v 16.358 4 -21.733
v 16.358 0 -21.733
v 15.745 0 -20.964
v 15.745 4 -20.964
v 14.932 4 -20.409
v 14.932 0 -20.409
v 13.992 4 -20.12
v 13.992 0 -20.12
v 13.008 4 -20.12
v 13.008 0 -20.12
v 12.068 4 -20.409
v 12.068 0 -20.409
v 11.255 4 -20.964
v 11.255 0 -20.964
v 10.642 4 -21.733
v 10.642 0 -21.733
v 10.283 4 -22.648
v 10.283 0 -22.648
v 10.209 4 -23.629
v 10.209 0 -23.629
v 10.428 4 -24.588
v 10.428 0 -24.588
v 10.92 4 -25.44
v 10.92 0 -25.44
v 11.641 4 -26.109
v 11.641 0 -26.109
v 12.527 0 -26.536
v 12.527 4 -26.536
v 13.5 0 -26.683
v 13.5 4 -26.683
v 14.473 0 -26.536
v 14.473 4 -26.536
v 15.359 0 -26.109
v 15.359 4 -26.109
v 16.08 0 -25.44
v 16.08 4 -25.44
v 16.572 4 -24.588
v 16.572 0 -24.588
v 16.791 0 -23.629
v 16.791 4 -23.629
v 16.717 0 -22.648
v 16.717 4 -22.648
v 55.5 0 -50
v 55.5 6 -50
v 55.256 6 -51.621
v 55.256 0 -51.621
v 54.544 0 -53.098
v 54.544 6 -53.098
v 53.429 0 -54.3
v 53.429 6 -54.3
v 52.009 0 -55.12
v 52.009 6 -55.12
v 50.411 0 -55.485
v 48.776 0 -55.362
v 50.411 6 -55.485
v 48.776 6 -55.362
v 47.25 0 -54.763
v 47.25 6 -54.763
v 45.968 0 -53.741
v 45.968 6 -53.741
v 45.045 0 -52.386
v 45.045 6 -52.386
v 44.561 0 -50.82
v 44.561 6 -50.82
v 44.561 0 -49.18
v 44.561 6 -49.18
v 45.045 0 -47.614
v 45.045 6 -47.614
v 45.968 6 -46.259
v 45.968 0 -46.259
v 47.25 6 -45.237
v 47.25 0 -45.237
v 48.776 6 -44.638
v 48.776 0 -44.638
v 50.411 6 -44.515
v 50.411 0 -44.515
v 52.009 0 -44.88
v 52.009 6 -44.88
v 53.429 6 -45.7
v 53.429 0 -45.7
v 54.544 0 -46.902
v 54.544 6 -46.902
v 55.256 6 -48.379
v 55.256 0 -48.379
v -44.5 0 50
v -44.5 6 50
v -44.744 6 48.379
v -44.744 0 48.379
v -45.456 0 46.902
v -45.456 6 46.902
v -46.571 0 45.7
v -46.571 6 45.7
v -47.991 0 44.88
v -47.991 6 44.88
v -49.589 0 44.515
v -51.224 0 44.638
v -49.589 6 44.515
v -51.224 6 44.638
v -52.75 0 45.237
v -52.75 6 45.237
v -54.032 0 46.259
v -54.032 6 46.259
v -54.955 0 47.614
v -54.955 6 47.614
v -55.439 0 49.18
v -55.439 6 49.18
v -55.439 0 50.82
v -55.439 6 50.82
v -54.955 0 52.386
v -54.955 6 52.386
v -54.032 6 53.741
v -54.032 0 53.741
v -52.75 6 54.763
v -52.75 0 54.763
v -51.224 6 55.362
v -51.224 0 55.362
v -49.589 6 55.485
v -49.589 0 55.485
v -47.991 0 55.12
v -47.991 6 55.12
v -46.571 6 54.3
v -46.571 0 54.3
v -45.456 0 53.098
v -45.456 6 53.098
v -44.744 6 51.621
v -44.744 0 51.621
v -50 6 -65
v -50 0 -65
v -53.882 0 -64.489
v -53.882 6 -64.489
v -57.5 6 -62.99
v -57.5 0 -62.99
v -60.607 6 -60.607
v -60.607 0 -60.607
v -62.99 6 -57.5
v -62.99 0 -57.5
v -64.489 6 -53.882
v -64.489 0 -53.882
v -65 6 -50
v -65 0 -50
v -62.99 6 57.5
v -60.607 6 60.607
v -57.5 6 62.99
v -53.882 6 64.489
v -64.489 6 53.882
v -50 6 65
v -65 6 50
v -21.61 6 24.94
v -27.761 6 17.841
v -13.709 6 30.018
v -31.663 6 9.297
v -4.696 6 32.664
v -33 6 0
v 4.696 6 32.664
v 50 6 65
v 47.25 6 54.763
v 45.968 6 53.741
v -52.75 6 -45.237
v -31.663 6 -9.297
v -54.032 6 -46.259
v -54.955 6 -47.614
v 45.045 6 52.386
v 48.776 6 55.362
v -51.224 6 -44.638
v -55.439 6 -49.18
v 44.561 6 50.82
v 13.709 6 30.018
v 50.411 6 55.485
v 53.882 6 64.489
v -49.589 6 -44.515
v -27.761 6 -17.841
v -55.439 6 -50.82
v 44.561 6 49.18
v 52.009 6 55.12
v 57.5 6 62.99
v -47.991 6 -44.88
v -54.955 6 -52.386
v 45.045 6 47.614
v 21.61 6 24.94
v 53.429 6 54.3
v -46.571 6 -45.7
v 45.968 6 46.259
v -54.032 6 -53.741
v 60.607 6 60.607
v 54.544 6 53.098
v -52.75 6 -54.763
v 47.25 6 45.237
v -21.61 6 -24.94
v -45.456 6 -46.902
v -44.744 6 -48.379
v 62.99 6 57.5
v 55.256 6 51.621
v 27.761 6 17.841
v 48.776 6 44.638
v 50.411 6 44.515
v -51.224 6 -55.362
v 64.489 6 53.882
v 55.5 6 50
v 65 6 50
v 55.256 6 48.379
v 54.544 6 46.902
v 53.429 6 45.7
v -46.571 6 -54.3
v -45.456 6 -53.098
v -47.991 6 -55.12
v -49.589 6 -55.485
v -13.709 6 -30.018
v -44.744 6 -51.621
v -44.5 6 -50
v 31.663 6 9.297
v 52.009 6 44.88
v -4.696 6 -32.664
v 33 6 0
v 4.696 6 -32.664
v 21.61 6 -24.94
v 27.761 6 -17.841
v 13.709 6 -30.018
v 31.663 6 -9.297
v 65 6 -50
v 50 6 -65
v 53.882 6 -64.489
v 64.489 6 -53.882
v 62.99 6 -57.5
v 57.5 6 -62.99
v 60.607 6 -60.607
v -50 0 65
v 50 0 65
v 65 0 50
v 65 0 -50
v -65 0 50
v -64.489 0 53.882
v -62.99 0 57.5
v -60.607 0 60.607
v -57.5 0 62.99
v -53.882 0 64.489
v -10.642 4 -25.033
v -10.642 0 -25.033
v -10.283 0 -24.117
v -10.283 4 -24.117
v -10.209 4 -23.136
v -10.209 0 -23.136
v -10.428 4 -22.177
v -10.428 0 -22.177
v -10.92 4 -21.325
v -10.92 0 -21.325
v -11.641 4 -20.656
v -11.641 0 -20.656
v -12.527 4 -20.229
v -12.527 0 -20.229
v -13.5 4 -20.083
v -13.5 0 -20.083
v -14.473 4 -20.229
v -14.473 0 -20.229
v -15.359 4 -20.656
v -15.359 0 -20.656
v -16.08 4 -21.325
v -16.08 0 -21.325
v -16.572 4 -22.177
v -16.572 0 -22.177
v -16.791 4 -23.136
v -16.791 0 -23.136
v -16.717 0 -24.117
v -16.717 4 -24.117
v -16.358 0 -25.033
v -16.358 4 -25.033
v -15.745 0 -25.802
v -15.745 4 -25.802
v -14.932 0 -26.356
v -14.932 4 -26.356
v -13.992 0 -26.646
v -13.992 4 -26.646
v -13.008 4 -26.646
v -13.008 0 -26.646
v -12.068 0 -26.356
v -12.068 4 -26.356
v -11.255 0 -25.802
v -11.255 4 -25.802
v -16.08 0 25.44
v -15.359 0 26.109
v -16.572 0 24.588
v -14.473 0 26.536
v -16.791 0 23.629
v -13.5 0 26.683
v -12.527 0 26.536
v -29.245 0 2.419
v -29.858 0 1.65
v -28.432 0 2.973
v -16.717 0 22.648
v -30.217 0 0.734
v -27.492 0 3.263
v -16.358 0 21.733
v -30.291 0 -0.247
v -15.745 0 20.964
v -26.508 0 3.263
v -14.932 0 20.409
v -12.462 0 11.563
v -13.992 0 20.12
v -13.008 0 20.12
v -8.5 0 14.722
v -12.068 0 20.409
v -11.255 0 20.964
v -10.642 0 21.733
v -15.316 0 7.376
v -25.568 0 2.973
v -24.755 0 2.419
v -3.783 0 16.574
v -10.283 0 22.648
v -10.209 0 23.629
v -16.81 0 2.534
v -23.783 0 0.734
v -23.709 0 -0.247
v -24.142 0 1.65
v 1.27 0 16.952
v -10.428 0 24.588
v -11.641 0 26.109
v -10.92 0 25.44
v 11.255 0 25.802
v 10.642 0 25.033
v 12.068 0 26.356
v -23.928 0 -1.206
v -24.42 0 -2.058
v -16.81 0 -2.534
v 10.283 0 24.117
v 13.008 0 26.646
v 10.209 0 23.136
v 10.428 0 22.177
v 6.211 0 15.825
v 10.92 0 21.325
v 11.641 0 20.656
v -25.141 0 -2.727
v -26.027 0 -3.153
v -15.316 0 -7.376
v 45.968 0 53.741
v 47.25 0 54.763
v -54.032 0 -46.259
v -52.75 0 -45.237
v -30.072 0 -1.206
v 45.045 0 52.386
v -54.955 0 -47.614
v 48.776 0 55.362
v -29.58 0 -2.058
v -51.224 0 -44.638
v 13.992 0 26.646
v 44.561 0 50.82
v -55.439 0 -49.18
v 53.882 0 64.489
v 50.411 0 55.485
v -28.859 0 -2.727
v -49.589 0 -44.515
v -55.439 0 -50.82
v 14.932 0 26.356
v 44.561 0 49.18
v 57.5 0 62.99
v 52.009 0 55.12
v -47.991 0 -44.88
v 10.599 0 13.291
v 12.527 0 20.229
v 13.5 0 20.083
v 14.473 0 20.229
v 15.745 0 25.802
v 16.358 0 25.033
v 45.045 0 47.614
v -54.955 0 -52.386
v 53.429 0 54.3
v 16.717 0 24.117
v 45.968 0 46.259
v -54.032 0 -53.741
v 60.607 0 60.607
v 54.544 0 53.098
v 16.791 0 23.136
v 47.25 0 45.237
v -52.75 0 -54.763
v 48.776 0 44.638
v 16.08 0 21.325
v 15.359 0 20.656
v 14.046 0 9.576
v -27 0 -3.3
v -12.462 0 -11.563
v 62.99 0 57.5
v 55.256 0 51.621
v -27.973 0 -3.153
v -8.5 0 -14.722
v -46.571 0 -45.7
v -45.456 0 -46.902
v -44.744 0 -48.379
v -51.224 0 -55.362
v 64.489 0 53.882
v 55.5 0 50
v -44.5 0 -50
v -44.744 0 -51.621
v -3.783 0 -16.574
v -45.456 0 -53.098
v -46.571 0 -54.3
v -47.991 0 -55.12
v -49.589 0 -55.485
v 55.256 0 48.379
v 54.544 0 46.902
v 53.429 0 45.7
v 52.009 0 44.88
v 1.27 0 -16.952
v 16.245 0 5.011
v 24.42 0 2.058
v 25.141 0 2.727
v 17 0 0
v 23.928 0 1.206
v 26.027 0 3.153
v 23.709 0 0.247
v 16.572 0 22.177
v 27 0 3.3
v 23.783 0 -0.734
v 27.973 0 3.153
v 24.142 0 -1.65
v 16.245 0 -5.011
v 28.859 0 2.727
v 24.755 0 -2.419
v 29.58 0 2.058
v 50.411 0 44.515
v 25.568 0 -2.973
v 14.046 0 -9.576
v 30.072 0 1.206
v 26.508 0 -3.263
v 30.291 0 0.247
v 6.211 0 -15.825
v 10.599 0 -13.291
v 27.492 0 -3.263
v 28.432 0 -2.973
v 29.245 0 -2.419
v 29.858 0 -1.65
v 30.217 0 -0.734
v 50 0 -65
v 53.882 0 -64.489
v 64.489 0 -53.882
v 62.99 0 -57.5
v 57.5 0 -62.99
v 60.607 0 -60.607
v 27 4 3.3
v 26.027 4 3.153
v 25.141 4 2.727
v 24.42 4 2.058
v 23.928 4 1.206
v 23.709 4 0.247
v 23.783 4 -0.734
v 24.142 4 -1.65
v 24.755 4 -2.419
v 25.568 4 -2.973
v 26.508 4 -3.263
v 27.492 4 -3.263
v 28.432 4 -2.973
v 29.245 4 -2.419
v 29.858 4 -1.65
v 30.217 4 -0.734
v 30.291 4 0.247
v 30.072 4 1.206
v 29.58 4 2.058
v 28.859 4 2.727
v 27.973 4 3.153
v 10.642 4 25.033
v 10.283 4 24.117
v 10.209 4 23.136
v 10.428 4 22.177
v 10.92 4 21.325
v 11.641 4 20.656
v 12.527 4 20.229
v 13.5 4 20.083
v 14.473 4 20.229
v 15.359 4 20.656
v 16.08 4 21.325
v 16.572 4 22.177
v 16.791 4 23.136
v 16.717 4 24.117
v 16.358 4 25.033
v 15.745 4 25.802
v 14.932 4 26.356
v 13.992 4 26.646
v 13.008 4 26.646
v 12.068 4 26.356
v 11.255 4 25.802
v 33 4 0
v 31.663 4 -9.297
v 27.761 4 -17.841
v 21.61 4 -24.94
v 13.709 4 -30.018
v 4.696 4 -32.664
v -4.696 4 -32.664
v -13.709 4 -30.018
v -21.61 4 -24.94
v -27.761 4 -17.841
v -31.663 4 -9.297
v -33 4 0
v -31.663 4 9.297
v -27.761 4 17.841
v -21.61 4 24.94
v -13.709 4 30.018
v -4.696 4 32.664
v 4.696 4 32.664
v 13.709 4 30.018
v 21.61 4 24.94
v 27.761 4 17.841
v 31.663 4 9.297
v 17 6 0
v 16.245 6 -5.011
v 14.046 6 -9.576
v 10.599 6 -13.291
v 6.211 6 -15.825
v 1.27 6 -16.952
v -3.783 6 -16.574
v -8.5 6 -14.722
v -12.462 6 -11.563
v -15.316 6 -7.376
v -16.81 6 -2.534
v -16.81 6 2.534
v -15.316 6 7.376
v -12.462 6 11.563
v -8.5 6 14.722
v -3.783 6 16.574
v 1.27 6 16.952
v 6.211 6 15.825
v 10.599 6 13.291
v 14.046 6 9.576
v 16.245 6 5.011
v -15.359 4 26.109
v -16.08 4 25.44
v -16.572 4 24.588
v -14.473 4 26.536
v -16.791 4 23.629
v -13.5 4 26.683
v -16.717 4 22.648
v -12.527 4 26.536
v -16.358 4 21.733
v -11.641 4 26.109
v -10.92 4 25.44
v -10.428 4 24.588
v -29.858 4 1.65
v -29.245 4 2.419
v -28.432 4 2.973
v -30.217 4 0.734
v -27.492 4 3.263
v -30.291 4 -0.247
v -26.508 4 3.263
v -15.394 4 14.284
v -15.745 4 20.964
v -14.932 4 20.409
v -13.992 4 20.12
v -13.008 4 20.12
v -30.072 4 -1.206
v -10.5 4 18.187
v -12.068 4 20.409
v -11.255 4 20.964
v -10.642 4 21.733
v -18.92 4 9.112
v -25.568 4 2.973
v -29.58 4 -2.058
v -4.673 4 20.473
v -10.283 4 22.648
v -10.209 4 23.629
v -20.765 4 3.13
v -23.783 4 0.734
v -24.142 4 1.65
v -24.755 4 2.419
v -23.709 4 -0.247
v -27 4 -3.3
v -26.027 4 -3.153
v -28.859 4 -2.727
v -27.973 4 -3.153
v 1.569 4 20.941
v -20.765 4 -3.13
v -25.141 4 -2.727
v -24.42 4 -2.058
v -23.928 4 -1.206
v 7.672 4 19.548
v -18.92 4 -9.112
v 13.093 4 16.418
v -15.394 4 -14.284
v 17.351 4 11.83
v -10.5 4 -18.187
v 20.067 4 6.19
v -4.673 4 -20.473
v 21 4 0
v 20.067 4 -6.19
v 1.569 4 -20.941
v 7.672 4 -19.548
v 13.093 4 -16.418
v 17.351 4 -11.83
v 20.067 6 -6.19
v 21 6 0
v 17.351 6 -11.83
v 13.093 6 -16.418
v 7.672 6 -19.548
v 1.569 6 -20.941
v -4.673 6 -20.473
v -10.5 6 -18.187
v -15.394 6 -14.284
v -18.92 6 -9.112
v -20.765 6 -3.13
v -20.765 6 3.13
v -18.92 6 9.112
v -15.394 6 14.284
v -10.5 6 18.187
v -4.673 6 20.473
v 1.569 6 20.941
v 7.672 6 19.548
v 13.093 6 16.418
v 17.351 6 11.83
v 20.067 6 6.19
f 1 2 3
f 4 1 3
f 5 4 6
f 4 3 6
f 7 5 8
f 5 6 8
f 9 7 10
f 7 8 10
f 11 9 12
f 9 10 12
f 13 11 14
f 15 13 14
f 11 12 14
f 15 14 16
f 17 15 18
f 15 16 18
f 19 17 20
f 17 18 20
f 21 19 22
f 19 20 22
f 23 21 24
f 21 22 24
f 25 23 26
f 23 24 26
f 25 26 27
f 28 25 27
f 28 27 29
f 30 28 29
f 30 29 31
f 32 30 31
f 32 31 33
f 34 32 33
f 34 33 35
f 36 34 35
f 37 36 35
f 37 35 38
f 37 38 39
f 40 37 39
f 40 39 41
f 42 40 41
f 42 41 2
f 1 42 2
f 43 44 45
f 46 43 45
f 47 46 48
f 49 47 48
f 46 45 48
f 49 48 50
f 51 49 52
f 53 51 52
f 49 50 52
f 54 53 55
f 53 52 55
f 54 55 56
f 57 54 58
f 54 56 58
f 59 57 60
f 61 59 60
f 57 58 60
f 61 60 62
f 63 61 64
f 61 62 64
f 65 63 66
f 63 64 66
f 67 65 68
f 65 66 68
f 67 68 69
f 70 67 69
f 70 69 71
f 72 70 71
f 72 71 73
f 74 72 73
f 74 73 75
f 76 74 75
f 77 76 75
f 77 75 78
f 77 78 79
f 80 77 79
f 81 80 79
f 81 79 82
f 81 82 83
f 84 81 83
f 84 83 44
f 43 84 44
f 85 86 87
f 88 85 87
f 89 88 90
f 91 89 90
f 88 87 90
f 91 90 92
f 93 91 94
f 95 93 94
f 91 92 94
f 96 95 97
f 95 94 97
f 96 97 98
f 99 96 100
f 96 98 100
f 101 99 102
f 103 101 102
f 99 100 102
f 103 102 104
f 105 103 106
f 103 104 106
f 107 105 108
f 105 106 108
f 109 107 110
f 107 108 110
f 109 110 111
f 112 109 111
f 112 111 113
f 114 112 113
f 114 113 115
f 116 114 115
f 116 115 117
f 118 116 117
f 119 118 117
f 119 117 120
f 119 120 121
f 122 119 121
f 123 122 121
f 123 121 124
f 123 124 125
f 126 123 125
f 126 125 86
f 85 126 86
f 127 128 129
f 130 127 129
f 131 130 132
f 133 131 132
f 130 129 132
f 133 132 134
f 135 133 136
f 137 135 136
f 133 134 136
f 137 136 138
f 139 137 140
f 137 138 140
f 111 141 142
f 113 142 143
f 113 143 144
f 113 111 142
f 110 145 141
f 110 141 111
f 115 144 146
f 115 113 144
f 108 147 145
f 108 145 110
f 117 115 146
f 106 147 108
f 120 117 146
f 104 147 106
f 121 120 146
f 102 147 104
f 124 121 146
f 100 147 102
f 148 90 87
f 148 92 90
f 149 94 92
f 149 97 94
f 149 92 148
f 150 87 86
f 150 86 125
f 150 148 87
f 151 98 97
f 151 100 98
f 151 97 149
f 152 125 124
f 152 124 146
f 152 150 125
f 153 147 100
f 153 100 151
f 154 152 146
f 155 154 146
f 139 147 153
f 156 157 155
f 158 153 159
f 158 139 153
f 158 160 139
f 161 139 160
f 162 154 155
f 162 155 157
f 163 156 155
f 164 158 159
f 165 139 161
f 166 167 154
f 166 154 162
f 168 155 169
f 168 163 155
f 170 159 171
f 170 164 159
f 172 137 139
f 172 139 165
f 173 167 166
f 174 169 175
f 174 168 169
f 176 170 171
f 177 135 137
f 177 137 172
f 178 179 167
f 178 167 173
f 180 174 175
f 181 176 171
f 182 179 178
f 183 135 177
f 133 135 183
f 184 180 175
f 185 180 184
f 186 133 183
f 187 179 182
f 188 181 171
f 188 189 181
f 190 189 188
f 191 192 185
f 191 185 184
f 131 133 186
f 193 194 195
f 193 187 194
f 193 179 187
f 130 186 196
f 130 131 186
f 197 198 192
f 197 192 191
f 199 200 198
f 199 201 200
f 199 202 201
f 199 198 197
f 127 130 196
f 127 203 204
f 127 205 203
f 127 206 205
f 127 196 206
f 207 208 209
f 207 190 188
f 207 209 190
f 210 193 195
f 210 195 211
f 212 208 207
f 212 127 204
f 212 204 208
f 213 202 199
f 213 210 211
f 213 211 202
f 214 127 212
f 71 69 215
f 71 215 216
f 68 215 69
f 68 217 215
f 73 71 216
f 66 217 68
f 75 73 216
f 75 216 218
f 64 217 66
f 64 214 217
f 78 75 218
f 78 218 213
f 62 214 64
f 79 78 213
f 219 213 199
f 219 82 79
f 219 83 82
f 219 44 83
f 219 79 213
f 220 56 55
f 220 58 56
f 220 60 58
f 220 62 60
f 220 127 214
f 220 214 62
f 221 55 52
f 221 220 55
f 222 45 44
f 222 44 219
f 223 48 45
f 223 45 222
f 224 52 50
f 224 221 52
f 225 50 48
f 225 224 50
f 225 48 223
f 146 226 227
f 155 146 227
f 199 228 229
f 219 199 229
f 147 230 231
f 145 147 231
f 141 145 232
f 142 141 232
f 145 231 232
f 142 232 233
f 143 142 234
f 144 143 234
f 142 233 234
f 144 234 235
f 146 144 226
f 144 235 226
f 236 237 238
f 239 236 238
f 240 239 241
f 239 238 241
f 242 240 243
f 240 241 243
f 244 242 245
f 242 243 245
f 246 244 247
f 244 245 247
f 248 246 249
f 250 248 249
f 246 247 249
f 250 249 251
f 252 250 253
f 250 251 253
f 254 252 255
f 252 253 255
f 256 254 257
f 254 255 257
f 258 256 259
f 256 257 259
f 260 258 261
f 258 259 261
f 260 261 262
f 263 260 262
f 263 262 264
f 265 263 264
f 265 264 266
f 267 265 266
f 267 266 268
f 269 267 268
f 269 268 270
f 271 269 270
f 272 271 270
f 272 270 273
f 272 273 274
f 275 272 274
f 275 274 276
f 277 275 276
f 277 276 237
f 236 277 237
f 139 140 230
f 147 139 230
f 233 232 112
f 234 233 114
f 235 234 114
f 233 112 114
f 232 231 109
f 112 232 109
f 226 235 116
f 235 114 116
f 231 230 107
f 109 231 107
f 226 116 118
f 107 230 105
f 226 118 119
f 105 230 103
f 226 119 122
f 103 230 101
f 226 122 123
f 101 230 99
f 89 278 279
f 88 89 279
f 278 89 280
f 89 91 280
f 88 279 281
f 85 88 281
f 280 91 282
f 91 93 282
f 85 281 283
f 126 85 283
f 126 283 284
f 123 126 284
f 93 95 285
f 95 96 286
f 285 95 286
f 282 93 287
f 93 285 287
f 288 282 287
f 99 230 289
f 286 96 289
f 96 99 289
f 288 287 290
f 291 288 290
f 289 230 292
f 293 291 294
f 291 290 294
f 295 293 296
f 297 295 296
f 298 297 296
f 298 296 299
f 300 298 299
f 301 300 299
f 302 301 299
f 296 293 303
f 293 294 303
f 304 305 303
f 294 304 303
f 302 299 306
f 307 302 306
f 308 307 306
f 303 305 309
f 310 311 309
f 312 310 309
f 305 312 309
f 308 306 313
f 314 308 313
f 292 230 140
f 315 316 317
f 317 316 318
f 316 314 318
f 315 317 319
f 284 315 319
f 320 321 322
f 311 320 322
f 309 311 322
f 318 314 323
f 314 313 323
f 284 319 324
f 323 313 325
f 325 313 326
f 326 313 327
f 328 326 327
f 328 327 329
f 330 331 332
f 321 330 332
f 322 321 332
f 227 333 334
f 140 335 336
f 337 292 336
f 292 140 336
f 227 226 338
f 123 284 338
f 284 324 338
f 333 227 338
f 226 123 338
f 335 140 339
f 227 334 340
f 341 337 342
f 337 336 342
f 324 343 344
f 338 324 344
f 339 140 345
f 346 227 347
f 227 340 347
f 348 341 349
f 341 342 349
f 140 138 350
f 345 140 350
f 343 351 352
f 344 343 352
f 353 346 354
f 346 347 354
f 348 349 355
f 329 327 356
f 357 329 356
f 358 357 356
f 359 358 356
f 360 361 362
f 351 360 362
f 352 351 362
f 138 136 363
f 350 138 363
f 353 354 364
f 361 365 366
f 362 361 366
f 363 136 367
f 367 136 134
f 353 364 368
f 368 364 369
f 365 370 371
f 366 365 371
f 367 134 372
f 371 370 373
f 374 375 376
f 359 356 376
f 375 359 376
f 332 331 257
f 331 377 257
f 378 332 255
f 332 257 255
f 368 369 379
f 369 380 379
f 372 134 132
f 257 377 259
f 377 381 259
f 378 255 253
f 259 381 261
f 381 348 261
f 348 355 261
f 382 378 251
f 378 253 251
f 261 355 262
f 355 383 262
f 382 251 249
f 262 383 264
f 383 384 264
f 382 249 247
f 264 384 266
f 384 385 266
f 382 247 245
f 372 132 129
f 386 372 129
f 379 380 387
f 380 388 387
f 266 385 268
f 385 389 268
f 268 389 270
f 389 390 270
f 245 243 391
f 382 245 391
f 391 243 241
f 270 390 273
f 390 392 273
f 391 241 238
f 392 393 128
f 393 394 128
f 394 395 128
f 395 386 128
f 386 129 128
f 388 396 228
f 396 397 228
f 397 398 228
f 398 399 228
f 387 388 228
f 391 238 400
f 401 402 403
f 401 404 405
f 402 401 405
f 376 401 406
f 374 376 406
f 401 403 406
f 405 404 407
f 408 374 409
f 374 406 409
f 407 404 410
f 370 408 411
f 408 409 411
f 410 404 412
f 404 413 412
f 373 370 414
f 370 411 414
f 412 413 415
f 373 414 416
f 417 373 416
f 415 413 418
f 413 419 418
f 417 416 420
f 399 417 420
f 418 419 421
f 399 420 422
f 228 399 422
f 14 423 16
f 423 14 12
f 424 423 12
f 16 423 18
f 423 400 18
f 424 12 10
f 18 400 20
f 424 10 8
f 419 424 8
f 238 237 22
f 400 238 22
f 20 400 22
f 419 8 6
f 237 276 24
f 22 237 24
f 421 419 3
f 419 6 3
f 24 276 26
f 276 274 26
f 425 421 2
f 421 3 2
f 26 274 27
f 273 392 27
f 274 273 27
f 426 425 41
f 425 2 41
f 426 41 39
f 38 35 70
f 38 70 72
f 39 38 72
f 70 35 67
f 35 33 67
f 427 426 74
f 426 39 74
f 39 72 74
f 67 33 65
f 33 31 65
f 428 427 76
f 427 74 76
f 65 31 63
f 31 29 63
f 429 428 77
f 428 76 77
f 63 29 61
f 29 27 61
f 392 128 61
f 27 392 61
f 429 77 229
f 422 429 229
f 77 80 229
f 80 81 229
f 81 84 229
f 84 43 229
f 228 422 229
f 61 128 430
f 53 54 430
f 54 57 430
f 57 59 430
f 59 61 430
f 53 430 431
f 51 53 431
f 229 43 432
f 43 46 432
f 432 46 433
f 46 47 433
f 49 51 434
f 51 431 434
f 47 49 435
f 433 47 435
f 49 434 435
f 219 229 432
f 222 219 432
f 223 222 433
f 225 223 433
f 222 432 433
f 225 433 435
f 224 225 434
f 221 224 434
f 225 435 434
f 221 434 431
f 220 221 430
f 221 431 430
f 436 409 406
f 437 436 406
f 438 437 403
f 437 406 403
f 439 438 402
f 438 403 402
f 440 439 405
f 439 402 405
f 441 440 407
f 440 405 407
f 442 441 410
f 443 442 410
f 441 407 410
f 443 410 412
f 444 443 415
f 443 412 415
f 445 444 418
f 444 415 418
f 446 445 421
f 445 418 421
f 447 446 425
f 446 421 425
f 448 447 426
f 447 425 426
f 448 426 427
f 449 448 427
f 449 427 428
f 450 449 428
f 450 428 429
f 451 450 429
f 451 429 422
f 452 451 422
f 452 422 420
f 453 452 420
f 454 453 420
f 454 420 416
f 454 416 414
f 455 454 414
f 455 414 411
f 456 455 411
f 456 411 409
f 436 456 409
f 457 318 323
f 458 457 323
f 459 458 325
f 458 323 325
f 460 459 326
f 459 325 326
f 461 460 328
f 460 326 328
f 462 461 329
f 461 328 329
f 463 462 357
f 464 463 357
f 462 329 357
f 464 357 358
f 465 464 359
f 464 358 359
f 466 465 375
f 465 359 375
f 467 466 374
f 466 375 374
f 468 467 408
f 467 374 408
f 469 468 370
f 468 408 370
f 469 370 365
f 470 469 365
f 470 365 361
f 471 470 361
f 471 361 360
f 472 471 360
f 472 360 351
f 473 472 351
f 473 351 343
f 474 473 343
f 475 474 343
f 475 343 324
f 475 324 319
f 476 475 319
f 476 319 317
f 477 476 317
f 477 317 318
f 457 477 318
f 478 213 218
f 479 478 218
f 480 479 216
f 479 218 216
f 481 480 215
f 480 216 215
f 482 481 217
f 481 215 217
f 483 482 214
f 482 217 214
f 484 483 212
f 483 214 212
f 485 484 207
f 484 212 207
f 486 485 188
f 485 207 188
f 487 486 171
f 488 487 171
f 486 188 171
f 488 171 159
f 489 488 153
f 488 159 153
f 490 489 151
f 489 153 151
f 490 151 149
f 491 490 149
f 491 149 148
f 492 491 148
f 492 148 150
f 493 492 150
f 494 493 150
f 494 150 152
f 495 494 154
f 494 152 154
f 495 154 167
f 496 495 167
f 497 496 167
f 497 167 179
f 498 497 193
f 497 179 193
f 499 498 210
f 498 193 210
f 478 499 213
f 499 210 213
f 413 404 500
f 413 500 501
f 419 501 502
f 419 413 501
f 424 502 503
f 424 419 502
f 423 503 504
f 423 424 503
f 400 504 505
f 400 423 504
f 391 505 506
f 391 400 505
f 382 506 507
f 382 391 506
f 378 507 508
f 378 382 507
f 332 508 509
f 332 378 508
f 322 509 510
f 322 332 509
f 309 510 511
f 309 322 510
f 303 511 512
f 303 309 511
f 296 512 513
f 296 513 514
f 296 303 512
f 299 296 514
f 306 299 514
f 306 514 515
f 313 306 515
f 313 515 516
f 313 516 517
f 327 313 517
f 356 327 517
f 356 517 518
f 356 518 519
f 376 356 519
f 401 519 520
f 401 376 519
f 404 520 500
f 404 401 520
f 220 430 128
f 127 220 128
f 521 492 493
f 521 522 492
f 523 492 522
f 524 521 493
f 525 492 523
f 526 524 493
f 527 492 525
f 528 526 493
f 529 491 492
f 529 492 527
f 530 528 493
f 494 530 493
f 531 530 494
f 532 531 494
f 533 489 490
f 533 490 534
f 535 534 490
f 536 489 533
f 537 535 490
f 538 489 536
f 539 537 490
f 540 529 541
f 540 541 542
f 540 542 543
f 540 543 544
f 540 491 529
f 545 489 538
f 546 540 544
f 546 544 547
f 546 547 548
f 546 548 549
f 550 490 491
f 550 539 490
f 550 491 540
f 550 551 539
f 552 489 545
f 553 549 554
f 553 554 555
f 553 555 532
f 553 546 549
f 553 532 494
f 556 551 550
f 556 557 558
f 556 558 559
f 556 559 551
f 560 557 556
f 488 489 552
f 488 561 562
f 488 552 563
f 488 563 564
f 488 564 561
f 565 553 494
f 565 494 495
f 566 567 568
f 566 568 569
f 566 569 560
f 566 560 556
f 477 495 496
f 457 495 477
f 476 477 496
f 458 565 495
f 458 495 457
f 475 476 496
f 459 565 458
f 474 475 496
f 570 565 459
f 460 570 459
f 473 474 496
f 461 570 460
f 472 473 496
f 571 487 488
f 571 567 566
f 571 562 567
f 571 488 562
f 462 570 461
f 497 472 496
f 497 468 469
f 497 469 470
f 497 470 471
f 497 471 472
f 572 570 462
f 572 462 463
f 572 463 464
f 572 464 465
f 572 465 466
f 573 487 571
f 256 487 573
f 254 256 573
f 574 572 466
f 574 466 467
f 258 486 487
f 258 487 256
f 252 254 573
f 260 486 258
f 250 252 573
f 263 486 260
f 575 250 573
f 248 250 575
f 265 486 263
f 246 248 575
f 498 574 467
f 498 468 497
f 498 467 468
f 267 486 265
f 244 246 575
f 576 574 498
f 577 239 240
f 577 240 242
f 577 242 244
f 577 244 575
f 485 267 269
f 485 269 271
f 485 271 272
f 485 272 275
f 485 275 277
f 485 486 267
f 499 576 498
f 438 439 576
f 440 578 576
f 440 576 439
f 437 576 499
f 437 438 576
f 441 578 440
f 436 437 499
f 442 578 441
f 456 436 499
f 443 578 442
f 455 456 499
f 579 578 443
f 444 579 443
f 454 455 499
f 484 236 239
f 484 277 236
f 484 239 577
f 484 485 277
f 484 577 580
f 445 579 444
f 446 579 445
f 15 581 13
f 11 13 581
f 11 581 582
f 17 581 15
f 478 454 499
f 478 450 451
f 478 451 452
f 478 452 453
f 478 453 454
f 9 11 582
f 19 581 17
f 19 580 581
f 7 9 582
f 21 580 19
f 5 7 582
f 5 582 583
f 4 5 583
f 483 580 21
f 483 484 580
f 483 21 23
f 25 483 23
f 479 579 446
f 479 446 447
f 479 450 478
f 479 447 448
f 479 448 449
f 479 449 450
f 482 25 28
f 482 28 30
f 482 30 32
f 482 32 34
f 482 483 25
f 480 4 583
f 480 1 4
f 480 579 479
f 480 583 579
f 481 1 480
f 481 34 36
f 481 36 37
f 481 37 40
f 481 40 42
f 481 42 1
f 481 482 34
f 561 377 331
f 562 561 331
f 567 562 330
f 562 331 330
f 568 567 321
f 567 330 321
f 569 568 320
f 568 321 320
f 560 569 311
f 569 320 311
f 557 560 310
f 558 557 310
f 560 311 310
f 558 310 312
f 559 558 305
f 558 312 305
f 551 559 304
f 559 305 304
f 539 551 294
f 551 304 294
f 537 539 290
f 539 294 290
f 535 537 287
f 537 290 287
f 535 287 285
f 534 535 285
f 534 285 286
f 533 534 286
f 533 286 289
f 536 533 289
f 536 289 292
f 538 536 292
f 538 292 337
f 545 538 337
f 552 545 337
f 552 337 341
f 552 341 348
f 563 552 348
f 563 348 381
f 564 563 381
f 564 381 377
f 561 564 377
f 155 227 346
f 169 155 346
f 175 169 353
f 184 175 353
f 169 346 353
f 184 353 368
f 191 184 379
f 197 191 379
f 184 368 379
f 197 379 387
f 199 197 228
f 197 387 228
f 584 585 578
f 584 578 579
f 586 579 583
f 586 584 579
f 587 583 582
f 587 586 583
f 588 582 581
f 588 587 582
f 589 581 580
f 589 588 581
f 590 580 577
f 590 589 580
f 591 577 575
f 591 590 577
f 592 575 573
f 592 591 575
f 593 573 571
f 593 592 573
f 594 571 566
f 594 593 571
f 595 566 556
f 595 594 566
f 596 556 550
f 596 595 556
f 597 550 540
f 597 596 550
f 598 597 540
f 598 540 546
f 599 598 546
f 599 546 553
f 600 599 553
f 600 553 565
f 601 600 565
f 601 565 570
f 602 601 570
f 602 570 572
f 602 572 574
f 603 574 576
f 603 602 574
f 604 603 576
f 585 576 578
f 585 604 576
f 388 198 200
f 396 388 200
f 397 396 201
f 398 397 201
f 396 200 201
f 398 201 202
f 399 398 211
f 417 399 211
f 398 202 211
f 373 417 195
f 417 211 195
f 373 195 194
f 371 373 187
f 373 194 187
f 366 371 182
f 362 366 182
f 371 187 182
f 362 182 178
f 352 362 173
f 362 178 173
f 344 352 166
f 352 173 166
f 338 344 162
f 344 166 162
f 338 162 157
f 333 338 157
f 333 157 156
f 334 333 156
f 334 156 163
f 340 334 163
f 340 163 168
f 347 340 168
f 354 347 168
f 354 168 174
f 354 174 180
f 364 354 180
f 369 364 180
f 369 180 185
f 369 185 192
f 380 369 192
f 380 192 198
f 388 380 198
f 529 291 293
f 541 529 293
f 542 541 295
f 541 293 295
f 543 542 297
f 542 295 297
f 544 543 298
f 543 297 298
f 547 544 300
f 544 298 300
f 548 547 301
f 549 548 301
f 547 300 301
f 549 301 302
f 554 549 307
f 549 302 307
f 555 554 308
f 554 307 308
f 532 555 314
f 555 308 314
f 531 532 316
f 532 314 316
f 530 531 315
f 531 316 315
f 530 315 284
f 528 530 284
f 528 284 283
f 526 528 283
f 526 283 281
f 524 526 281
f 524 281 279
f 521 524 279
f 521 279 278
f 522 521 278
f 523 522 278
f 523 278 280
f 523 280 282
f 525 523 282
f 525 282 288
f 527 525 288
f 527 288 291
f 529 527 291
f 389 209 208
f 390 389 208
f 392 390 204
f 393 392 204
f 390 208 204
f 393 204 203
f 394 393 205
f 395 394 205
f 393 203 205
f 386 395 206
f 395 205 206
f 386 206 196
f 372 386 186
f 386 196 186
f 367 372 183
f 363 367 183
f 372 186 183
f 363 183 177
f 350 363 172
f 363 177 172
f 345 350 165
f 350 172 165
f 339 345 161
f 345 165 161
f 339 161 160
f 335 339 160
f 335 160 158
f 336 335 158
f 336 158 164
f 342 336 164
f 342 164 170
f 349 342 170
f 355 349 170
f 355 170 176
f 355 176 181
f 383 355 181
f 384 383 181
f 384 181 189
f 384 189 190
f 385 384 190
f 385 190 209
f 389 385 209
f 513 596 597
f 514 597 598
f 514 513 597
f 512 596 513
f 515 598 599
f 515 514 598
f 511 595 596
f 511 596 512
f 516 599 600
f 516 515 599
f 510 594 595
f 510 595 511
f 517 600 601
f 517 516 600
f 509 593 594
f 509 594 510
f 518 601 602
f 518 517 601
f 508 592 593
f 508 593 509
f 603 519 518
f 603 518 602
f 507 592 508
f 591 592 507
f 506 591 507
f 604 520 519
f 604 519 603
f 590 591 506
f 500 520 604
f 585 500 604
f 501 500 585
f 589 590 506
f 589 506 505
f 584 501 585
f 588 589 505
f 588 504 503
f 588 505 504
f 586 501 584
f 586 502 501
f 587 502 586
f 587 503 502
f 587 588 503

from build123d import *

# Parameters (mm, degrees)
SKETCH1_R                = 17
BOSS_EXTRUDE1_DEPTH      = 6
SKETCH2_R                = 33
SKETCH2_R_2              = 21
CUT_EXTRUDE1_DEPTH       = 2
SKETCH3_R                = 5.5
CUT_EXTRUDE2_DEPTH       = 1
CUT_EXTRUDE2_DEPTH_BACK  = 7
M6_CLEARANCE_HOLE1_D     = 6.6
M6_CLEARANCE_HOLE1_DEPTH = 4
CIRPATTERN1_COUNT        = 6


with BuildPart() as part:
    # Sketch1 → Boss-Extrude1 (new body)
    with BuildSketch(Plane(origin=(0, 0, 0), x_dir=(1, 0, 0), z_dir=(0, 1, 0))):
        with BuildLine():
            Line((-50, -65), (50, -65))
            ThreePointArc((50, -65), (60.606601718, -60.606601718), (65, -50))
            Line((65, -50), (65, 50))
            ThreePointArc((65, 50), (60.606601718, 60.606601718), (50, 65))
            Line((50, 65), (-50, 65))
            ThreePointArc((-50, 65), (-60.606601718, 60.606601718), (-65, 50))
            Line((-65, 50), (-65, -50))
            ThreePointArc((-65, -50), (-60.606601718, -60.606601718), (-50, -65))
        make_face()
        Circle(SKETCH1_R, mode=Mode.SUBTRACT)
    extrude(amount=BOSS_EXTRUDE1_DEPTH)

    # Sketch2 → Cut-Extrude1 (cut)
    with BuildSketch(Plane(origin=(0, 6, 0), x_dir=(1, 0, 0), z_dir=(0, 1, 0))):
        Circle(SKETCH2_R)
        Circle(SKETCH2_R_2, mode=Mode.SUBTRACT)
    extrude(amount=-CUT_EXTRUDE1_DEPTH, mode=Mode.SUBTRACT)

    # Sketch3 → Cut-Extrude2 (cut, two sides)
    with BuildSketch(Plane(origin=(0, 6, 0), x_dir=(1, 0, 0), z_dir=(0, 1, 0))) as cut_extrude2_sk:
        with Locations((-50, 50)):
            Circle(SKETCH3_R)
        with Locations((50, 50)):
            Circle(SKETCH3_R)
        with Locations((50, -50)):
            Circle(SKETCH3_R)
        with Locations((-50, -50)):
            Circle(SKETCH3_R)
    extrude(amount=CUT_EXTRUDE2_DEPTH, mode=Mode.SUBTRACT)
    extrude(cut_extrude2_sk.sketch, amount=-CUT_EXTRUDE2_DEPTH_BACK, mode=Mode.SUBTRACT)

    # M6 Clearance Hole1
    with Locations(Plane(origin=(-27, 4, 0), x_dir=(0, 0, 1), z_dir=(0, 1, 0))):
        with Locations((0, 0)):
            m6_clearance_hole1 = Hole(M6_CLEARANCE_HOLE1_D / 2, depth=M6_CLEARANCE_HOLE1_DEPTH)

    # CirPattern1: M6 Clearance Hole1 ×6 about axis
    cirpattern1_axis = Axis((0, 0, 0), (0, 1, 0))
    for i in range(1, CIRPATTERN1_COUNT):
        add(m6_clearance_hole1.rotate(cirpattern1_axis, i * 360 / CIRPATTERN1_COUNT), mode=Mode.SUBTRACT)


solid = part.part
